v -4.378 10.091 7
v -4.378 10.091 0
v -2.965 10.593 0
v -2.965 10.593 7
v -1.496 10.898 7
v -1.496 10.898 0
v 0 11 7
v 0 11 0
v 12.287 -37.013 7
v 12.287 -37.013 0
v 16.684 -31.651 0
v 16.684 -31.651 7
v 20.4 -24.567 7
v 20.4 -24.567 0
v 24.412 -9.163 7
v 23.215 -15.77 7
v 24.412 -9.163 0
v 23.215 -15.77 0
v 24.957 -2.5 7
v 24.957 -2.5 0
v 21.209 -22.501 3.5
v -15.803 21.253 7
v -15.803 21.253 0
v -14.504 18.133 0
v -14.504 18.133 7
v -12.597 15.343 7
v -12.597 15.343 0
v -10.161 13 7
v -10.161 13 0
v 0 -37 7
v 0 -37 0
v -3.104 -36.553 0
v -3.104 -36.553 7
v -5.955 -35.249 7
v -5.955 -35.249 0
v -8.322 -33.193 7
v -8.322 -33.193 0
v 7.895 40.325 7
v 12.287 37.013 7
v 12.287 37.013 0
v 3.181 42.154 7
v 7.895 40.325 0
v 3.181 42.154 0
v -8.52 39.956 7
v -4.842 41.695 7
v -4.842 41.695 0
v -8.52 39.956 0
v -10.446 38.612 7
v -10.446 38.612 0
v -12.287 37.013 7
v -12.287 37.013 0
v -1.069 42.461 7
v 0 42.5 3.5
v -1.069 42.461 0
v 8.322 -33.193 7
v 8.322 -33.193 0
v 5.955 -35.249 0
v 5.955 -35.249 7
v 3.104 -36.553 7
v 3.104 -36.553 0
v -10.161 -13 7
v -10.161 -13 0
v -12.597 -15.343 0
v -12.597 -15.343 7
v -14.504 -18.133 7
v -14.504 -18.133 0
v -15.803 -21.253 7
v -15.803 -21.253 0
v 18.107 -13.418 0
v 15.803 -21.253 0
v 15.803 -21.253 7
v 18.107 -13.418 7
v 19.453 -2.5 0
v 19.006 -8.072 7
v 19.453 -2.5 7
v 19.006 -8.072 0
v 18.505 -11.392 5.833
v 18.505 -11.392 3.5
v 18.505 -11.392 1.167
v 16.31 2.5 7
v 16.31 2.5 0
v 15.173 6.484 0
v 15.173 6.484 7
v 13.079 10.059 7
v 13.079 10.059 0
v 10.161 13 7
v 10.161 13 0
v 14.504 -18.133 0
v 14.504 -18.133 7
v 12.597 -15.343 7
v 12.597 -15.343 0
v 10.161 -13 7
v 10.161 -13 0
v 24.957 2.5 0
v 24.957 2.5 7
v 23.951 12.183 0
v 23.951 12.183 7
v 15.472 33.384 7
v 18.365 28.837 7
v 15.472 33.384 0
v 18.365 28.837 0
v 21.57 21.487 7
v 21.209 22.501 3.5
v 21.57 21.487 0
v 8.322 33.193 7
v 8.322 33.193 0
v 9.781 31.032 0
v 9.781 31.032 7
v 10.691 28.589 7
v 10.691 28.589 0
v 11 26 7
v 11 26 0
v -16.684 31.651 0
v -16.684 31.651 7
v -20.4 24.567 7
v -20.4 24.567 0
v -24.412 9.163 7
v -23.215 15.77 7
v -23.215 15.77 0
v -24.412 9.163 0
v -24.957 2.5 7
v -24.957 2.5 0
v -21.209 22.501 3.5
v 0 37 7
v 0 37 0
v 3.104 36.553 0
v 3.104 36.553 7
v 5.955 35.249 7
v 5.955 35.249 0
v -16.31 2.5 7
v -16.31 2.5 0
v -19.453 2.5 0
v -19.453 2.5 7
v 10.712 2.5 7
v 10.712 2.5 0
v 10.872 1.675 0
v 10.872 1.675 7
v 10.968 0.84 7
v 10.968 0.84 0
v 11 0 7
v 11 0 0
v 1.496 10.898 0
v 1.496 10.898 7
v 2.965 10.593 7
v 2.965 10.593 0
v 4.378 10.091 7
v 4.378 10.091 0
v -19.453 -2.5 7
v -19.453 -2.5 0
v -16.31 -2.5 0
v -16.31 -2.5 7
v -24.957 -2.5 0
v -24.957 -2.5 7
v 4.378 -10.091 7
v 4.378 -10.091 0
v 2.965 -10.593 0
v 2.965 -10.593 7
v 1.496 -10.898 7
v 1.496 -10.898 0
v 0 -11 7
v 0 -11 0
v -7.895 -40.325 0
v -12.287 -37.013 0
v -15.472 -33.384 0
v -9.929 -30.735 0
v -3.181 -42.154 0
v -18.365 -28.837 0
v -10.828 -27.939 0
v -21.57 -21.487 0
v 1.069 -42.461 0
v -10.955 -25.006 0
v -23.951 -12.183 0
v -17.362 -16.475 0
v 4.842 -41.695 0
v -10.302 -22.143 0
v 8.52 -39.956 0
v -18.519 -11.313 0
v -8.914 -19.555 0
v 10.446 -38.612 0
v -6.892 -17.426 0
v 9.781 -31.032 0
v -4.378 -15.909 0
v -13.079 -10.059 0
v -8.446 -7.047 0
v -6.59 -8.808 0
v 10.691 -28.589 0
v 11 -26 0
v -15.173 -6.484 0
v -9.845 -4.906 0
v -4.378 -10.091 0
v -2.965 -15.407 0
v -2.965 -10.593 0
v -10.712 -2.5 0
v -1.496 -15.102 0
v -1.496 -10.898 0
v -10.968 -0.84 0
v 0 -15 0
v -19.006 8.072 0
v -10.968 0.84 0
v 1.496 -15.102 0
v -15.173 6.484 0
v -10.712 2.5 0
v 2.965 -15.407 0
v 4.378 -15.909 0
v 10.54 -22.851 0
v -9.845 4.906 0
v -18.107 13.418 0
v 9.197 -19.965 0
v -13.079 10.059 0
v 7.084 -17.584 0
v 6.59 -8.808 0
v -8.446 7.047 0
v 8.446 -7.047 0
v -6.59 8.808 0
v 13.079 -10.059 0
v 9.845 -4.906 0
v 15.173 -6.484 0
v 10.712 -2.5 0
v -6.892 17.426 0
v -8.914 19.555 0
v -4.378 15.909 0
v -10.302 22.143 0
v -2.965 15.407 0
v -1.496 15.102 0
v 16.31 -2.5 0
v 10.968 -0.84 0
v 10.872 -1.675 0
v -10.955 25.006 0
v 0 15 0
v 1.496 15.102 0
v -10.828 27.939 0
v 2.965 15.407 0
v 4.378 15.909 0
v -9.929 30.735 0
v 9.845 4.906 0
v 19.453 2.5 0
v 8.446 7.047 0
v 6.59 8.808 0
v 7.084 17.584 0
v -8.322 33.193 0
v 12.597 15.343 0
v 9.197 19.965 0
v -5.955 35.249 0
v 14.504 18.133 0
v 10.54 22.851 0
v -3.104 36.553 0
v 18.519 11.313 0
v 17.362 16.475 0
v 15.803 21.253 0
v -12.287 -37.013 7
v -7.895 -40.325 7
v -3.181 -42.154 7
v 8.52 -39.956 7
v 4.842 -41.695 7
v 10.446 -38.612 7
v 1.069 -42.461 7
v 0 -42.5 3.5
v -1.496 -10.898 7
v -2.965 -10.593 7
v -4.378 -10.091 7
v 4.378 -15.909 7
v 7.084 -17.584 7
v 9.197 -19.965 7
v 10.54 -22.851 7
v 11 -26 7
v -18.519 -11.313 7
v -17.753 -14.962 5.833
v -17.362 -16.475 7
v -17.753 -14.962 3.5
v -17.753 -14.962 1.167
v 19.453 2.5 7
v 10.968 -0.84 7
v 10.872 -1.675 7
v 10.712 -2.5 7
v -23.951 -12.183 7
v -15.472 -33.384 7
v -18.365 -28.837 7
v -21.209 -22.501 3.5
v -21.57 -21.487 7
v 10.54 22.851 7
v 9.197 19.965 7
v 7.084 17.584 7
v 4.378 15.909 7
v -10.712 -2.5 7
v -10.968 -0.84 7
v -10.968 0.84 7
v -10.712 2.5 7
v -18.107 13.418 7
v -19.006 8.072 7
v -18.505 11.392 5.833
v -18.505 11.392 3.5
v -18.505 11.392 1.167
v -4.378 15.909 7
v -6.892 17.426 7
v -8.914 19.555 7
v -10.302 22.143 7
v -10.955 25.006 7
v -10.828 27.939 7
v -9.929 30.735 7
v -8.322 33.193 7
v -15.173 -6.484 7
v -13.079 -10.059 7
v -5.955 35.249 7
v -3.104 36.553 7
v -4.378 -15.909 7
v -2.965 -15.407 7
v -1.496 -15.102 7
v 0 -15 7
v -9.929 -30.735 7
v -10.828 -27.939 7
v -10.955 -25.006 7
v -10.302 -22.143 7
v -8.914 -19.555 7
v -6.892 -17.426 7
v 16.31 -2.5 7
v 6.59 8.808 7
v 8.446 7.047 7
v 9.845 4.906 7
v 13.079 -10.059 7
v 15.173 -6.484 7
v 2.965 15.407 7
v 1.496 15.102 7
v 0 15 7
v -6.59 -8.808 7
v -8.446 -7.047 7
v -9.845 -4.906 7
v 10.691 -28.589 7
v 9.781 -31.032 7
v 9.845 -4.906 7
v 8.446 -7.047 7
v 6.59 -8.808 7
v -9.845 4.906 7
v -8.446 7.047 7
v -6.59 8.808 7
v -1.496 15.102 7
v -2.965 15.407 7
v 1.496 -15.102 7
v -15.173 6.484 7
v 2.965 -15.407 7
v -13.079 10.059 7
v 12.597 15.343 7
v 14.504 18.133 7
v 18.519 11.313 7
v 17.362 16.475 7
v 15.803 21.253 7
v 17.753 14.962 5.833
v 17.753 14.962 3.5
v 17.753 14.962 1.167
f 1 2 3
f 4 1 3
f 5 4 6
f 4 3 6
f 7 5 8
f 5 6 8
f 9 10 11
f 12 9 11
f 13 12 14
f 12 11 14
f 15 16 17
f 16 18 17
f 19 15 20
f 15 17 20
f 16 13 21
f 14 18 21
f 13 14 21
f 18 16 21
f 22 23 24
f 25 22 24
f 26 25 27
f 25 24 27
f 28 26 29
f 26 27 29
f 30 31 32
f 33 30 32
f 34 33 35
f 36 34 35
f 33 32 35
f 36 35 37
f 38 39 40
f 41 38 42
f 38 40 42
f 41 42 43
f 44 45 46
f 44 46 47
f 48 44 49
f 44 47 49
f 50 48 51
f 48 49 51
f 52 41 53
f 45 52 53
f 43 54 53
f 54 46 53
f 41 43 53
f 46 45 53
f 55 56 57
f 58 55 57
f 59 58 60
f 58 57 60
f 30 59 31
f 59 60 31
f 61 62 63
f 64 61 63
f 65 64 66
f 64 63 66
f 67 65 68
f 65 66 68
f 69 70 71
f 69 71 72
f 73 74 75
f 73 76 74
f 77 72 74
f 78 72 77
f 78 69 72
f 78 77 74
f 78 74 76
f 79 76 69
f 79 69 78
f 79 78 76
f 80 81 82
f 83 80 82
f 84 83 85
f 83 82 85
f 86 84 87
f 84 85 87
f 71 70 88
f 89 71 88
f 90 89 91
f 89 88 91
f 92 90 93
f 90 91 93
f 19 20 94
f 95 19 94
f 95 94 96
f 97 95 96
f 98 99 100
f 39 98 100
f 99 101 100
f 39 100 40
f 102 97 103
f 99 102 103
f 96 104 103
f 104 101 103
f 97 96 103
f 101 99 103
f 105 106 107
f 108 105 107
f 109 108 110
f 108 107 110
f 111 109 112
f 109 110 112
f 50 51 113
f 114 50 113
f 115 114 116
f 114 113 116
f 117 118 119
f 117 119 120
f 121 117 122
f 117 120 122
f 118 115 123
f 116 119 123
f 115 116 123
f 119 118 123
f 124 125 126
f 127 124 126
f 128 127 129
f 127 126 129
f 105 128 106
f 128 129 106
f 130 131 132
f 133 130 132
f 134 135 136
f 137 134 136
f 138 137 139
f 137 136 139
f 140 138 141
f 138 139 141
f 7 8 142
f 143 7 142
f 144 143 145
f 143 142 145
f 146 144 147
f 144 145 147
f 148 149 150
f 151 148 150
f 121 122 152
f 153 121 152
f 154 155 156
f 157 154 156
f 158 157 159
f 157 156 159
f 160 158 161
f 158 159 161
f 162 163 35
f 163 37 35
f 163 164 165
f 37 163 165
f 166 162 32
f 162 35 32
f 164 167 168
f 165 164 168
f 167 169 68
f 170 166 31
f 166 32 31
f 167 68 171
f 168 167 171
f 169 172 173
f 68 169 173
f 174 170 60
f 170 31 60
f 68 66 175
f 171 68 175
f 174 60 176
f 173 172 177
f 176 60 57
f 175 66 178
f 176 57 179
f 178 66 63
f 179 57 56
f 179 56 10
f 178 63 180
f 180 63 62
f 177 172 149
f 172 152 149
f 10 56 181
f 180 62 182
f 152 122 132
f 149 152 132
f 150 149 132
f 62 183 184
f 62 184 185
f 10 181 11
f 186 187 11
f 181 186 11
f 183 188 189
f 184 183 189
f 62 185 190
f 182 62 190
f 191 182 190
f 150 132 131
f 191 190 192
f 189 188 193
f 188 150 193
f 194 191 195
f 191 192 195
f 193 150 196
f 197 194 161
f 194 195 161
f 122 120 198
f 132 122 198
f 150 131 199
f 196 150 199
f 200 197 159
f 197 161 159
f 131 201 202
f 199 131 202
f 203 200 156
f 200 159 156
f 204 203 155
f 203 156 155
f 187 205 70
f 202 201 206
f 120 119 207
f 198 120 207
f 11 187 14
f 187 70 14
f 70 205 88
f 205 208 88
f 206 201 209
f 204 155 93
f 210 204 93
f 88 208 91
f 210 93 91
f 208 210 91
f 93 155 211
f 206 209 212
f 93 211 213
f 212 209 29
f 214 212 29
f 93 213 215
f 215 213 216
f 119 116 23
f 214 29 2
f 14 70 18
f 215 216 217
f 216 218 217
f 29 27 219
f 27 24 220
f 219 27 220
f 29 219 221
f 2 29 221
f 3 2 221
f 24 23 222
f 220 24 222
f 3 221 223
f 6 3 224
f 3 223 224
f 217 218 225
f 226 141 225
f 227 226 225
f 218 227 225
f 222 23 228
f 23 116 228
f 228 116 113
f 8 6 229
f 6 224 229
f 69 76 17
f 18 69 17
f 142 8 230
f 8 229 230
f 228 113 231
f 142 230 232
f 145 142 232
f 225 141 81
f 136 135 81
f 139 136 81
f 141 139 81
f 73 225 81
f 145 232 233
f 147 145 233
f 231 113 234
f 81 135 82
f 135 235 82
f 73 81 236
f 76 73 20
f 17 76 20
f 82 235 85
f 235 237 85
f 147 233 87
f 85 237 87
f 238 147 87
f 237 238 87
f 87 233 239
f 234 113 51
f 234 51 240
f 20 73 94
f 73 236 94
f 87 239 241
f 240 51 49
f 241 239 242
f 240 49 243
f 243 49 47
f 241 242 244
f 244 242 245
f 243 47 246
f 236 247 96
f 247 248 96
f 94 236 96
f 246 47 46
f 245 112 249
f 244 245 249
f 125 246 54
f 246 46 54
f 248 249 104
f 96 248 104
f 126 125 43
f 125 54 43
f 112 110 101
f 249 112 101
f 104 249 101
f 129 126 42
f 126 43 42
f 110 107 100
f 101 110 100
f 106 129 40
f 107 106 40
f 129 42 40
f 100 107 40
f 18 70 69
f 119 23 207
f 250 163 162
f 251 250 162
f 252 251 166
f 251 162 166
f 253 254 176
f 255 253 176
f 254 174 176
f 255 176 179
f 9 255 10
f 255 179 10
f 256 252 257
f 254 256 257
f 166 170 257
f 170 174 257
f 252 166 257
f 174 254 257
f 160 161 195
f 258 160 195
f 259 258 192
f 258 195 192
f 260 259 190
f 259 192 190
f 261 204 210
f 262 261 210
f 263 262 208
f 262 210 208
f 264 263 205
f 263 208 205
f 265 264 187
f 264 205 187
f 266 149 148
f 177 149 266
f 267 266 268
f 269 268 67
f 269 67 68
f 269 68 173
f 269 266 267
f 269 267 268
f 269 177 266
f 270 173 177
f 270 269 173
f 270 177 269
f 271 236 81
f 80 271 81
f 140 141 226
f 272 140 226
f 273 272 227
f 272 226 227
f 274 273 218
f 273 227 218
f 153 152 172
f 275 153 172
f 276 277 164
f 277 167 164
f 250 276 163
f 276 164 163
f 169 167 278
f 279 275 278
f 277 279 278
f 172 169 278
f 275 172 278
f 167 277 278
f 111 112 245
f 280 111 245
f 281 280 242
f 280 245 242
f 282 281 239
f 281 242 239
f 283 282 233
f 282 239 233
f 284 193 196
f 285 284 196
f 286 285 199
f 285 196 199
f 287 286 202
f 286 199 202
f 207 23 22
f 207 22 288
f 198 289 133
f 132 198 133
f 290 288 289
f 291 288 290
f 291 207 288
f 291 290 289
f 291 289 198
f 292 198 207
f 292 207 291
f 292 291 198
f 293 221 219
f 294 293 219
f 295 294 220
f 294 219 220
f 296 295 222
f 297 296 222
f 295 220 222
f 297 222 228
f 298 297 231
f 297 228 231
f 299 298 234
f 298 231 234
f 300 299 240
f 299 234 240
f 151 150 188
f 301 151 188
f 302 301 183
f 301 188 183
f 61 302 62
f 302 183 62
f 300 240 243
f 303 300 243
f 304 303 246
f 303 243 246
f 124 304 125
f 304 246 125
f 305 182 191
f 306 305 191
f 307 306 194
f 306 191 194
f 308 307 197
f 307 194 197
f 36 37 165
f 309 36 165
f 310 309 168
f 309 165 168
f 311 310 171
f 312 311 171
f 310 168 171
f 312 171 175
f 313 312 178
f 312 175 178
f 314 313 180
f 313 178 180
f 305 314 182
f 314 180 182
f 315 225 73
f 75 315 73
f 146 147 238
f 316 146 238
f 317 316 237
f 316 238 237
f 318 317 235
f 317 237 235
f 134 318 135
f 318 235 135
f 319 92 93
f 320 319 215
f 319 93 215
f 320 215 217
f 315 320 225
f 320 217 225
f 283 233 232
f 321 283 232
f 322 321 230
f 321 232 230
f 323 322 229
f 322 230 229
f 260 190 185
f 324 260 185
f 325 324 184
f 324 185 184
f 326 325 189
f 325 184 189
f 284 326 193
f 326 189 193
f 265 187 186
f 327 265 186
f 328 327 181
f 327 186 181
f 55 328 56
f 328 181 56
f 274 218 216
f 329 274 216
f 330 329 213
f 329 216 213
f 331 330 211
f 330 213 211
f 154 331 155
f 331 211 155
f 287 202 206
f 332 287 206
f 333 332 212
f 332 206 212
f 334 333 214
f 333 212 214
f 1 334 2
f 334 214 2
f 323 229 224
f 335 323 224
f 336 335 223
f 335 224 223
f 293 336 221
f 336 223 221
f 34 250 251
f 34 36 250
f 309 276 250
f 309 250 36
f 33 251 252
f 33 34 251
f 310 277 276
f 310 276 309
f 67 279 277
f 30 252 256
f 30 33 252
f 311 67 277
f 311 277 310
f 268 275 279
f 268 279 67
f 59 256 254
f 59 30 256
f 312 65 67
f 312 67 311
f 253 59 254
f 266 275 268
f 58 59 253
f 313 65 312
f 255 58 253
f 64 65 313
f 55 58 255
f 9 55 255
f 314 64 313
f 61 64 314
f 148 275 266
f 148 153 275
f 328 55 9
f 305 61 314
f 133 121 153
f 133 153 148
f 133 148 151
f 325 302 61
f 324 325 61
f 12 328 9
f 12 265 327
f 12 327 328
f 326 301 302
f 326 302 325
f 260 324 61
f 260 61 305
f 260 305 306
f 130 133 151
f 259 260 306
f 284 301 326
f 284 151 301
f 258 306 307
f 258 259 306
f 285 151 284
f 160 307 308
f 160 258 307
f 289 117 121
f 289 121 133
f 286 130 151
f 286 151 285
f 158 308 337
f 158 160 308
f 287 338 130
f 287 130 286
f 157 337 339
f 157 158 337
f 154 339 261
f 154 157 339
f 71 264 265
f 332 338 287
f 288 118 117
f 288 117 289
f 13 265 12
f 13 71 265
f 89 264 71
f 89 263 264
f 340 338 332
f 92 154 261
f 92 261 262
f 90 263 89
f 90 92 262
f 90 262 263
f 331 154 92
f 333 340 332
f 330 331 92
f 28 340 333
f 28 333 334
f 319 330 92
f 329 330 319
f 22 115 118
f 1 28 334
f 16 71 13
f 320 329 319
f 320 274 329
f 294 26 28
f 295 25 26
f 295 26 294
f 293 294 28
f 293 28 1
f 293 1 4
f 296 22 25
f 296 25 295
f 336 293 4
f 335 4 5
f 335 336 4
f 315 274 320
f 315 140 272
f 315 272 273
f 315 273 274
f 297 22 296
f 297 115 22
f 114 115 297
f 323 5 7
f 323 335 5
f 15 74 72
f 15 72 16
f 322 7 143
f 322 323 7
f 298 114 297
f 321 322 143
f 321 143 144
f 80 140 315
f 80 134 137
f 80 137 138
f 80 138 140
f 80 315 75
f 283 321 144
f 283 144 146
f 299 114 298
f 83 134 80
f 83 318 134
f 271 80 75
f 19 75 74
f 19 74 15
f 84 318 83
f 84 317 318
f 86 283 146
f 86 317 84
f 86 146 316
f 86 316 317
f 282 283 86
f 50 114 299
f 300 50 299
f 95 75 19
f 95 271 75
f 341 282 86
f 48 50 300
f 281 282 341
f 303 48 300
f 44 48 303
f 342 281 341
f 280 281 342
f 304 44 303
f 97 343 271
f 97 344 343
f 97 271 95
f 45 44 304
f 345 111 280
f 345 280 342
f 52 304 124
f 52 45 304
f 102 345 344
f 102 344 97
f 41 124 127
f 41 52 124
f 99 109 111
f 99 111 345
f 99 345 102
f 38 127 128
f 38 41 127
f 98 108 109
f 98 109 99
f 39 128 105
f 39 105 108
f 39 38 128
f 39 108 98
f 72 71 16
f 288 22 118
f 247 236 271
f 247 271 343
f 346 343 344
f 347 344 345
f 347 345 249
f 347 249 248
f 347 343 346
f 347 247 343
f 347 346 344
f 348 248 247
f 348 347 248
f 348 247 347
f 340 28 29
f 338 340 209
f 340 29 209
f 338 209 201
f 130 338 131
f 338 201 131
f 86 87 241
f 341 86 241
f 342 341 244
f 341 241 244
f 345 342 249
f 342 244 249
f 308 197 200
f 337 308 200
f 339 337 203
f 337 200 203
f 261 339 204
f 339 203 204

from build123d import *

# Parameters (mm, degrees)
F1_DEPTH = 7


# Not quite as in the source:
# - the dataset's text gives a spline's control points without its knots; the knots are read off the source's solid


with BuildPart() as f1:
    # F0 (on Top) → F1 (new body)
    with BuildSketch(Plane.XY):
        with BuildLine():
            add(Edge.make_bspline(
                [(-12.2865300122, 37.0132275132), (-24.155068252, 25.6273275114), (-24.9567099242, 2.5)],
                knots=[0.5137667663, 0.5137667663, 0.5137667663, 1.5119388208, 1.5119388208, 1.5119388208], degree=2, weights=[1, 0.8780203772, 1]))
            Line((-24.9567099242, 2.5), (-19.453178151, 2.5))
            add(Edge.make_bspline(
                [(-15.8025424867, 21.2534590537), (-16.1608457903, 20.3198762687), (-16.869953541, 18.2823971156), (-17.7856543458, 14.9897380208), (-18.5393237245, 11.414650213), (-19.0884029155, 7.7049435305), (-19.352047015, 4.7083391393), (-19.4358731607, 2.9613993071), (-19.453178151, 2.5)],
                knots=[0.157845185, 0.157845185, 0.157845185, 0.157845185, 0.171875, 0.1875, 0.203125, 0.21875, 0.234375, 0.2399591803, 0.2399591803, 0.2399591803, 0.2399591803], degree=3))
            ThreePointArc((-15.8025424867, 21.2534590537), (-16.1040856287, 29.5928298126), (-12.2865300122, 37.0132275132))
        make_face()
        with BuildLine():
            Line((-19.453178151, 2.5), (-24.9567099242, 2.5))
            Line((-24.9567099242, 2.5), (-24.9567099242, -2.5))
            Line((-24.9567099242, -2.5), (-19.453178151, -2.5))
            add(Edge.make_bspline(
                [(-19.453178151, 2.5), (-19.4600835604, 2.3158825262), (-19.4877799652, 1.485210562), (-19.5095080905, 0), (-19.4877799652, -1.485210562), (-19.4600835604, -2.3158825262), (-19.453178151, -2.5)],
                knots=[0.2399591803, 0.2399591803, 0.2399591803, 0.2399591803, 0.2421875, 0.25, 0.2578125, 0.2600408197, 0.2600408197, 0.2600408197, 0.2600408197], degree=3))
        make_face()
        with BuildLine():
            Line((-19.453178151, -2.5), (-24.9567099242, -2.5))
            add(Edge.make_bspline(
                [(-24.9567099242, -2.5), (-24.155068252, -25.6273275114), (-12.2865300122, -37.0132275132)],
                knots=[1.6296538327, 1.6296538327, 1.6296538327, 2.6278258872, 2.6278258872, 2.6278258872], degree=2, weights=[1, 0.8780203772, 1]))
            ThreePointArc((-12.2865300122, -37.0132275132), (-16.1040856287, -29.5928298126), (-15.8025424867, -21.2534590537))
            add(Edge.make_bspline(
                [(-19.453178151, -2.5), (-19.4358731607, -2.9613993071), (-19.352047015, -4.7083391393), (-19.0884029155, -7.7049435305), (-18.5393237245, -11.414650213), (-17.7856543458, -14.9897380208), (-16.869953541, -18.2823971156), (-16.1608457903, -20.3198762687), (-15.8025424867, -21.2534590537)],
                knots=[0.2600408197, 0.2600408197, 0.2600408197, 0.2600408197, 0.265625, 0.28125, 0.296875, 0.3125, 0.328125, 0.342154815, 0.342154815, 0.342154815, 0.342154815], degree=3))
        make_face()
        with BuildLine():
            add(Edge.make_bspline(
                [(0, 42.5), (-6.5671780891, 42.5), (-12.2865300122, 37.0132275132)],
                knots=[0, 0, 0, 0.5137667663, 0.5137667663, 0.5137667663], degree=2, weights=[1, 0.967186505, 1]))
            ThreePointArc((-12.2865300122, 37.0132275132), (-16.1040856287, 29.5928298126), (-15.8025424867, 21.2534590537))
            add(Edge.make_bspline(
                [(-8.3223566434, 33.1929395869), (-8.7992109435, 32.7452255263), (-9.831903457, 31.6798268662), (-11.1152962392, 30.0683455079), (-12.1705625375, 28.5237462249), (-12.9418479396, 27.2765788333), (-13.6842337818, 25.9505034679), (-14.6253408369, 24.0934250391), (-15.3188374514, 22.5012494774), (-15.7618035271, 21.3596070883), (-15.8025424867, 21.2534590537)],
                knots=[0.0804159275, 0.0804159275, 0.0804159275, 0.0804159275, 0.09375, 0.109375, 0.1171875, 0.125, 0.1328125, 0.140625, 0.15625, 0.157845185, 0.157845185, 0.157845185, 0.157845185], degree=3))
            ThreePointArc((-8.3223566434, 33.1929395869), (-4.5758968817, 36.0030579189), (0, 37))
            ThreePointArc((0, 37), (4.5758968817, 36.0030579189), (8.3223566434, 33.1929395869))
            add(Edge.make_bspline(
                [(15.8025424867, 21.2534590537), (15.7618035271, 21.3596070883), (15.3188374514, 22.5012494774), (14.6253408369, 24.0934250391), (13.6842337818, 25.9505034679), (12.9418479396, 27.2765788333), (12.1705625375, 28.5237462249), (11.1152962392, 30.0683455079), (9.831903457, 31.6798268662), (8.7992109435, 32.7452255263), (8.3223566434, 33.1929395869)],
                knots=[0.842154815, 0.842154815, 0.842154815, 0.842154815, 0.84375, 0.859375, 0.8671875, 0.875, 0.8828125, 0.890625, 0.90625, 0.9195840725, 0.9195840725, 0.9195840725, 0.9195840725], degree=3))
            ThreePointArc((15.8025424867, 21.2534590537), (16.3247044542, 23.6012452221), (16.5, 26))
            ThreePointArc((16.5, 26), (15.4106739827, 31.8958567994), (12.2865300122, 37.0132275132))
            add(Edge.make_bspline(
                [(12.2865300122, 37.0132275132), (6.5671780891, 42.5), (0, 42.5)],
                knots=[5.7694185408, 5.7694185408, 5.7694185408, 6.2831853072, 6.2831853072, 6.2831853072], degree=2, weights=[1, 0.967186505, 1]))
        make_face()
        with BuildLine():
            Line((-16.3095064303, 2.5), (-19.453178151, 2.5))
            add(Edge.make_bspline(
                [(-19.453178151, 2.5), (-19.4600835604, 2.3158825262), (-19.4877799652, 1.485210562), (-19.5095080905, 0), (-19.4877799652, -1.485210562), (-19.4600835604, -2.3158825262), (-19.453178151, -2.5)],
                knots=[0.2399591803, 0.2399591803, 0.2399591803, 0.2399591803, 0.2421875, 0.25, 0.2578125, 0.2600408197, 0.2600408197, 0.2600408197, 0.2600408197], degree=3))
            Line((-19.453178151, -2.5), (-16.3095064303, -2.5))
            ThreePointArc((-16.3095064303, -2.5), (-16.5, 0), (-16.3095064303, 2.5))
        make_face()
        with BuildLine():
            ThreePointArc((-15.8025424867, -21.2534590537), (-16.1040856287, -29.5928298126), (-12.2865300122, -37.0132275132))
            add(Edge.make_bspline(
                [(-12.2865300122, -37.0132275132), (-6.5671782692, -42.4999998273), (-3.868e-07, -42.5)],
                knots=[2.6278258872, 2.6278258872, 2.6278258872, 3.1415926381, 3.1415926381, 3.1415926381], degree=2, weights=[1, 0.967186507, 1]))
            add(Edge.make_bspline(
                [(-3.868e-07, -42.5), (6.5671779091, -42.5000001727), (12.2865300122, -37.0132275132)],
                knots=[3.1415926381, 3.1415926381, 3.1415926381, 3.6553594199, 3.6553594199, 3.6553594199], degree=2, weights=[1, 0.967186503, 1]))
            ThreePointArc((12.2865300122, -37.0132275132), (15.4106739827, -31.8958567994), (16.5, -26))
            ThreePointArc((16.5, -26), (16.3247044542, -23.6012452221), (15.8025424867, -21.2534590537))
            add(Edge.make_bspline(
                [(8.3223566434, -33.1929395869), (8.7992109435, -32.7452255263), (9.831903457, -31.6798268662), (11.1152962392, -30.0683455079), (12.1705625375, -28.5237462249), (12.9418479396, -27.2765788333), (13.6842337818, -25.9505034679), (14.6253408369, -24.0934250391), (15.3188374514, -22.5012494774), (15.7618035271, -21.3596070883), (15.8025424867, -21.2534590537)],
                knots=[0.5804159275, 0.5804159275, 0.5804159275, 0.5804159275, 0.59375, 0.609375, 0.6171875, 0.625, 0.6328125, 0.640625, 0.65625, 0.657845185, 0.657845185, 0.657845185, 0.657845185], degree=3))
            ThreePointArc((8.3223566434, -33.1929395869), (4.5758969132, -36.0030579045), (6.92e-08, -37))
            ThreePointArc((6.92e-08, -37), (-4.5758968503, -36.0030579332), (-8.3223566434, -33.1929395869))
            add(Edge.make_bspline(
                [(-15.8025424867, -21.2534590537), (-15.7618035271, -21.3596070883), (-15.3188374514, -22.5012494774), (-14.6253408369, -24.0934250391), (-13.6842337818, -25.9505034679), (-12.9418479396, -27.2765788333), (-12.1705625375, -28.5237462249), (-11.1152962392, -30.0683455079), (-9.831903457, -31.6798268662), (-8.7992109435, -32.7452255263), (-8.3223566434, -33.1929395869)],
                knots=[0.342154815, 0.342154815, 0.342154815, 0.342154815, 0.34375, 0.359375, 0.3671875, 0.375, 0.3828125, 0.390625, 0.40625, 0.4195840725, 0.4195840725, 0.4195840725, 0.4195840725], degree=3))
        make_face()
        with BuildLine():
            add(Edge.make_bspline(
                [(-8.3223566434, 33.1929395869), (-8.7992109435, 32.7452255263), (-9.831903457, 31.6798268662), (-11.1152962392, 30.0683455079), (-12.1705625375, 28.5237462249), (-12.9418479396, 27.2765788333), (-13.6842337818, 25.9505034679), (-14.6253408369, 24.0934250391), (-15.3188374514, 22.5012494774), (-15.7618035271, 21.3596070883), (-15.8025424867, 21.2534590537)],
                knots=[0.0804159275, 0.0804159275, 0.0804159275, 0.0804159275, 0.09375, 0.109375, 0.1171875, 0.125, 0.1328125, 0.140625, 0.15625, 0.157845185, 0.157845185, 0.157845185, 0.157845185], degree=3))
            ThreePointArc((-15.8025424867, 21.2534590537), (-13.6220001053, 16.6891937443), (-10.1612007165, 13))
            ThreePointArc((-10.1612007165, 13), (-7.4135261595, 14.7407472633), (-4.3777543105, 15.9086538462))
            ThreePointArc((-4.3777543105, 15.9086538462), (-10.7242639818, 23.5525192446), (-8.3223566434, 33.1929395869))
        make_face()
        with BuildLine():
            Line((-10.7121426428, 2.5), (-16.3095064303, 2.5))
            ThreePointArc((-16.3095064303, 2.5), (-16.5, 0), (-16.3095064303, -2.5))
            Line((-16.3095064303, -2.5), (-10.7121426428, -2.5))
            ThreePointArc((-10.7121426428, -2.5), (-11, 0), (-10.7121426428, 2.5))
        make_face()
        with BuildLine():
            ThreePointArc((-10.1612007165, 13), (-14.238577324, 8.3374406018), (-16.3095064303, 2.5))
            Line((-16.3095064303, 2.5), (-10.7121426428, 2.5))
            ThreePointArc((-10.7121426428, 2.5), (-8.4459091649, 7.0474547446), (-4.3777543105, 10.0913461538))
            ThreePointArc((-4.3777543105, 10.0913461538), (-7.4135261595, 11.2592527367), (-10.1612007165, 13))
        make_face()
        with BuildLine():
            ThreePointArc((-10.1612007165, -13), (-13.6220001053, -16.6891937443), (-15.8025424867, -21.2534590537))
            add(Edge.make_bspline(
                [(-15.8025424867, -21.2534590537), (-15.7618035271, -21.3596070883), (-15.3188374514, -22.5012494774), (-14.6253408369, -24.0934250391), (-13.6842337818, -25.9505034679), (-12.9418479396, -27.2765788333), (-12.1705625375, -28.5237462249), (-11.1152962392, -30.0683455079), (-9.831903457, -31.6798268662), (-8.7992109435, -32.7452255263), (-8.3223566434, -33.1929395869)],
                knots=[0.342154815, 0.342154815, 0.342154815, 0.342154815, 0.34375, 0.359375, 0.3671875, 0.375, 0.3828125, 0.390625, 0.40625, 0.4195840725, 0.4195840725, 0.4195840725, 0.4195840725], degree=3))
            ThreePointArc((-8.3223566434, -33.1929395869), (-10.7242639818, -23.5525192446), (-4.3777543105, -15.9086538462))
            ThreePointArc((-4.3777543105, -15.9086538462), (-7.4135261595, -14.7407472633), (-10.1612007165, -13))
        make_face()
        with BuildLine():
            Line((-10.7121426428, -2.5), (-16.3095064303, -2.5))
            ThreePointArc((-16.3095064303, -2.5), (-14.238577324, -8.3374406018), (-10.1612007165, -13))
            ThreePointArc((-10.1612007165, -13), (-7.4135261595, -11.2592527367), (-4.3777543105, -10.0913461538))
            ThreePointArc((-4.3777543105, -10.0913461538), (-8.4459091649, -7.0474547446), (-10.7121426428, -2.5))
        make_face()
        with BuildLine():
            add(Edge.make_bspline(
                [(24.9567099242, 2.5), (24.155068252, 25.6273275114), (12.2865300122, 37.0132275132)],
                knots=[4.7712464863, 4.7712464863, 4.7712464863, 5.7694185408, 5.7694185408, 5.7694185408], degree=2, weights=[1, 0.8780203772, 1]))
            ThreePointArc((12.2865300122, 37.0132275132), (15.4106739827, 31.8958567994), (16.5, 26))
            ThreePointArc((16.5, 26), (16.3247044542, 23.6012452221), (15.8025424867, 21.2534590537))
            add(Edge.make_bspline(
                [(19.453178151, 2.5), (19.4358731607, 2.9613993071), (19.352047015, 4.7083391393), (19.0884029155, 7.7049435305), (18.5393237245, 11.414650213), (17.7856543458, 14.9897380208), (16.869953541, 18.2823971156), (16.1608457903, 20.3198762687), (15.8025424867, 21.2534590537)],
                knots=[0.7600408197, 0.7600408197, 0.7600408197, 0.7600408197, 0.765625, 0.78125, 0.796875, 0.8125, 0.828125, 0.842154815, 0.842154815, 0.842154815, 0.842154815], degree=3))
            Line((19.453178151, 2.5), (24.9567099242, 2.5))
        make_face()
        with BuildLine():
            ThreePointArc((-4.3777543105, 15.9086538462), (-7.4135261595, 14.7407472633), (-10.1612007165, 13))
            ThreePointArc((-10.1612007165, 13), (-7.4135261595, 11.2592527367), (-4.3777543105, 10.0913461538))
            ThreePointArc((-4.3777543105, 10.0913461538), (-2.2355303965, 10.7704412094), (0, 11))
            Line((0, 11), (0, 15))
            ThreePointArc((0, 15), (-2.2355303965, 15.2295587906), (-4.3777543105, 15.9086538462))
        make_face()
        with BuildLine():
            ThreePointArc((16.5, -26), (15.4106739827, -31.8958567994), (12.2865300122, -37.0132275132))
            add(Edge.make_bspline(
                [(12.2865300122, -37.0132275132), (24.155068252, -25.6273275114), (24.9567099242, -2.5)],
                knots=[3.6553594199, 3.6553594199, 3.6553594199, 4.6535314744, 4.6535314744, 4.6535314744], degree=2, weights=[1, 0.8780203772, 1]))
            Line((24.9567099242, -2.5), (19.453178151, -2.5))
            add(Edge.make_bspline(
                [(15.8025424867, -21.2534590537), (16.1608457903, -20.3198762687), (16.869953541, -18.2823971156), (17.7856543458, -14.9897380208), (18.5393237245, -11.414650213), (19.0884029155, -7.7049435305), (19.352047015, -4.7083391393), (19.4358731607, -2.9613993071), (19.453178151, -2.5)],
                knots=[0.657845185, 0.657845185, 0.657845185, 0.657845185, 0.671875, 0.6875, 0.703125, 0.71875, 0.734375, 0.7399591803, 0.7399591803, 0.7399591803, 0.7399591803], degree=3))
            ThreePointArc((15.8025424867, -21.2534590537), (16.3247044542, -23.6012452221), (16.5, -26))
        make_face()
        with BuildLine():
            ThreePointArc((-4.3777543105, -10.0913461538), (-7.4135261595, -11.2592527367), (-10.1612007165, -13))
            ThreePointArc((-10.1612007165, -13), (-7.4135261595, -14.7407472633), (-4.3777543105, -15.9086538462))
            ThreePointArc((-4.3777543105, -15.9086538462), (-2.2355303965, -15.2295587906), (0, -15))
            Line((0, -15), (0, -11))
            ThreePointArc((0, -11), (-2.2355303965, -10.7704412094), (-4.3777543105, -10.0913461538))
        make_face()
        with BuildLine():
            Line((24.9567099242, -2.5), (24.9567099242, 2.5))
            Line((24.9567099242, 2.5), (19.453178151, 2.5))
            add(Edge.make_bspline(
                [(19.453178151, -2.5), (19.4600835604, -2.3158825262), (19.4877799652, -1.485210562), (19.5095080905, 0), (19.4877799652, 1.485210562), (19.4600835604, 2.3158825262), (19.453178151, 2.5)],
                knots=[0.7399591803, 0.7399591803, 0.7399591803, 0.7399591803, 0.7421875, 0.75, 0.7578125, 0.7600408197, 0.7600408197, 0.7600408197, 0.7600408197], degree=3))
            Line((19.453178151, -2.5), (24.9567099242, -2.5))
        make_face()
        with BuildLine():
            add(Edge.make_bspline(
                [(19.453178151, -2.5), (19.4600835604, -2.3158825262), (19.4877799652, -1.485210562), (19.5095080905, 0), (19.4877799652, 1.485210562), (19.4600835604, 2.3158825262), (19.453178151, 2.5)],
                knots=[0.7399591803, 0.7399591803, 0.7399591803, 0.7399591803, 0.7421875, 0.75, 0.7578125, 0.7600408197, 0.7600408197, 0.7600408197, 0.7600408197], degree=3))
            Line((19.453178151, 2.5), (16.3095064303, 2.5))
            ThreePointArc((16.3095064303, 2.5), (16.4523076816, 1.253623528), (16.5, 0))
            ThreePointArc((16.5, 0), (16.4523076816, -1.253623528), (16.3095064303, -2.5))
            Line((16.3095064303, -2.5), (19.453178151, -2.5))
        make_face()
        with BuildLine():
            ThreePointArc((10.1612007165, 13), (13.6220001053, 16.6891937443), (15.8025424867, 21.2534590537))
            add(Edge.make_bspline(
                [(15.8025424867, 21.2534590537), (15.7618035271, 21.3596070883), (15.3188374514, 22.5012494774), (14.6253408369, 24.0934250391), (13.6842337818, 25.9505034679), (12.9418479396, 27.2765788333), (12.1705625375, 28.5237462249), (11.1152962392, 30.0683455079), (9.831903457, 31.6798268662), (8.7992109435, 32.7452255263), (8.3223566434, 33.1929395869)],
                knots=[0.842154815, 0.842154815, 0.842154815, 0.842154815, 0.84375, 0.859375, 0.8671875, 0.875, 0.8828125, 0.890625, 0.90625, 0.9195840725, 0.9195840725, 0.9195840725, 0.9195840725], degree=3))
            ThreePointArc((8.3223566434, 33.1929395869), (10.3088778021, 29.8375823719), (11, 26))
            ThreePointArc((11, 26), (9.1966107185, 19.9649066874), (4.3777543105, 15.9086538462))
            ThreePointArc((4.3777543105, 15.9086538462), (7.4135261595, 14.7407472633), (10.1612007165, 13))
        make_face()
        with BuildLine():
            ThreePointArc((4.3777543105, 15.9086538462), (2.2355303965, 15.2295587906), (0, 15))
            Line((0, 15), (0, 11))
            ThreePointArc((0, 11), (2.2355303965, 10.7704412094), (4.3777543105, 10.0913461538))
            ThreePointArc((4.3777543105, 10.0913461538), (7.4135261595, 11.2592527367), (10.1612007165, 13))
            ThreePointArc((10.1612007165, 13), (7.4135261595, 14.7407472633), (4.3777543105, 15.9086538462))
        make_face()
        with BuildLine():
            Line((16.3095064303, 2.5), (10.7121426428, 2.5))
            ThreePointArc((10.7121426428, 2.5), (10.9277987049, 1.258258902), (11, 0))
            ThreePointArc((11, 0), (10.9277987049, -1.258258902), (10.7121426428, -2.5))
            Line((10.7121426428, -2.5), (16.3095064303, -2.5))
            ThreePointArc((16.3095064303, -2.5), (16.4523076816, -1.253623528), (16.5, 0))
            ThreePointArc((16.5, 0), (16.4523076816, 1.253623528), (16.3095064303, 2.5))
        make_face()
        with BuildLine():
            ThreePointArc((4.3777543105, 10.0913461538), (8.4459091649, 7.0474547446), (10.7121426428, 2.5))
            Line((10.7121426428, 2.5), (16.3095064303, 2.5))
            ThreePointArc((16.3095064303, 2.5), (14.238577324, 8.3374406018), (10.1612007165, 13))
            ThreePointArc((10.1612007165, 13), (7.4135261595, 11.2592527367), (4.3777543105, 10.0913461538))
        make_face()
        with BuildLine():
            add(Edge.make_bspline(
                [(8.3223566434, -33.1929395869), (8.7992109435, -32.7452255263), (9.831903457, -31.6798268662), (11.1152962392, -30.0683455079), (12.1705625375, -28.5237462249), (12.9418479396, -27.2765788333), (13.6842337818, -25.9505034679), (14.6253408369, -24.0934250391), (15.3188374514, -22.5012494774), (15.7618035271, -21.3596070883), (15.8025424867, -21.2534590537)],
                knots=[0.5804159275, 0.5804159275, 0.5804159275, 0.5804159275, 0.59375, 0.609375, 0.6171875, 0.625, 0.6328125, 0.640625, 0.65625, 0.657845185, 0.657845185, 0.657845185, 0.657845185], degree=3))
            ThreePointArc((15.8025424867, -21.2534590537), (13.6220001053, -16.6891937443), (10.1612007165, -13))
            ThreePointArc((10.1612007165, -13), (7.4135261595, -14.7407472633), (4.3777543105, -15.9086538462))
            ThreePointArc((4.3777543105, -15.9086538462), (9.1966107185, -19.9649066874), (11, -26))
            ThreePointArc((11, -26), (10.3088778021, -29.8375823719), (8.3223566434, -33.1929395869))
        make_face()
        with BuildLine():
            Line((0, -11), (0, -15))
            ThreePointArc((0, -15), (2.2355303965, -15.2295587906), (4.3777543105, -15.9086538462))
            ThreePointArc((4.3777543105, -15.9086538462), (7.4135261595, -14.7407472633), (10.1612007165, -13))
            ThreePointArc((10.1612007165, -13), (7.4135261595, -11.2592527367), (4.3777543105, -10.0913461538))
            ThreePointArc((4.3777543105, -10.0913461538), (2.2355303965, -10.7704412094), (0, -11))
        make_face()
        with BuildLine():
            Line((16.3095064303, -2.5), (10.7121426428, -2.5))
            ThreePointArc((10.7121426428, -2.5), (8.4459091649, -7.0474547446), (4.3777543105, -10.0913461538))
            ThreePointArc((4.3777543105, -10.0913461538), (7.4135261595, -11.2592527367), (10.1612007165, -13))
            ThreePointArc((10.1612007165, -13), (14.238577324, -8.3374406018), (16.3095064303, -2.5))
        make_face()
    extrude(amount=F1_DEPTH)


solid = f1.part
